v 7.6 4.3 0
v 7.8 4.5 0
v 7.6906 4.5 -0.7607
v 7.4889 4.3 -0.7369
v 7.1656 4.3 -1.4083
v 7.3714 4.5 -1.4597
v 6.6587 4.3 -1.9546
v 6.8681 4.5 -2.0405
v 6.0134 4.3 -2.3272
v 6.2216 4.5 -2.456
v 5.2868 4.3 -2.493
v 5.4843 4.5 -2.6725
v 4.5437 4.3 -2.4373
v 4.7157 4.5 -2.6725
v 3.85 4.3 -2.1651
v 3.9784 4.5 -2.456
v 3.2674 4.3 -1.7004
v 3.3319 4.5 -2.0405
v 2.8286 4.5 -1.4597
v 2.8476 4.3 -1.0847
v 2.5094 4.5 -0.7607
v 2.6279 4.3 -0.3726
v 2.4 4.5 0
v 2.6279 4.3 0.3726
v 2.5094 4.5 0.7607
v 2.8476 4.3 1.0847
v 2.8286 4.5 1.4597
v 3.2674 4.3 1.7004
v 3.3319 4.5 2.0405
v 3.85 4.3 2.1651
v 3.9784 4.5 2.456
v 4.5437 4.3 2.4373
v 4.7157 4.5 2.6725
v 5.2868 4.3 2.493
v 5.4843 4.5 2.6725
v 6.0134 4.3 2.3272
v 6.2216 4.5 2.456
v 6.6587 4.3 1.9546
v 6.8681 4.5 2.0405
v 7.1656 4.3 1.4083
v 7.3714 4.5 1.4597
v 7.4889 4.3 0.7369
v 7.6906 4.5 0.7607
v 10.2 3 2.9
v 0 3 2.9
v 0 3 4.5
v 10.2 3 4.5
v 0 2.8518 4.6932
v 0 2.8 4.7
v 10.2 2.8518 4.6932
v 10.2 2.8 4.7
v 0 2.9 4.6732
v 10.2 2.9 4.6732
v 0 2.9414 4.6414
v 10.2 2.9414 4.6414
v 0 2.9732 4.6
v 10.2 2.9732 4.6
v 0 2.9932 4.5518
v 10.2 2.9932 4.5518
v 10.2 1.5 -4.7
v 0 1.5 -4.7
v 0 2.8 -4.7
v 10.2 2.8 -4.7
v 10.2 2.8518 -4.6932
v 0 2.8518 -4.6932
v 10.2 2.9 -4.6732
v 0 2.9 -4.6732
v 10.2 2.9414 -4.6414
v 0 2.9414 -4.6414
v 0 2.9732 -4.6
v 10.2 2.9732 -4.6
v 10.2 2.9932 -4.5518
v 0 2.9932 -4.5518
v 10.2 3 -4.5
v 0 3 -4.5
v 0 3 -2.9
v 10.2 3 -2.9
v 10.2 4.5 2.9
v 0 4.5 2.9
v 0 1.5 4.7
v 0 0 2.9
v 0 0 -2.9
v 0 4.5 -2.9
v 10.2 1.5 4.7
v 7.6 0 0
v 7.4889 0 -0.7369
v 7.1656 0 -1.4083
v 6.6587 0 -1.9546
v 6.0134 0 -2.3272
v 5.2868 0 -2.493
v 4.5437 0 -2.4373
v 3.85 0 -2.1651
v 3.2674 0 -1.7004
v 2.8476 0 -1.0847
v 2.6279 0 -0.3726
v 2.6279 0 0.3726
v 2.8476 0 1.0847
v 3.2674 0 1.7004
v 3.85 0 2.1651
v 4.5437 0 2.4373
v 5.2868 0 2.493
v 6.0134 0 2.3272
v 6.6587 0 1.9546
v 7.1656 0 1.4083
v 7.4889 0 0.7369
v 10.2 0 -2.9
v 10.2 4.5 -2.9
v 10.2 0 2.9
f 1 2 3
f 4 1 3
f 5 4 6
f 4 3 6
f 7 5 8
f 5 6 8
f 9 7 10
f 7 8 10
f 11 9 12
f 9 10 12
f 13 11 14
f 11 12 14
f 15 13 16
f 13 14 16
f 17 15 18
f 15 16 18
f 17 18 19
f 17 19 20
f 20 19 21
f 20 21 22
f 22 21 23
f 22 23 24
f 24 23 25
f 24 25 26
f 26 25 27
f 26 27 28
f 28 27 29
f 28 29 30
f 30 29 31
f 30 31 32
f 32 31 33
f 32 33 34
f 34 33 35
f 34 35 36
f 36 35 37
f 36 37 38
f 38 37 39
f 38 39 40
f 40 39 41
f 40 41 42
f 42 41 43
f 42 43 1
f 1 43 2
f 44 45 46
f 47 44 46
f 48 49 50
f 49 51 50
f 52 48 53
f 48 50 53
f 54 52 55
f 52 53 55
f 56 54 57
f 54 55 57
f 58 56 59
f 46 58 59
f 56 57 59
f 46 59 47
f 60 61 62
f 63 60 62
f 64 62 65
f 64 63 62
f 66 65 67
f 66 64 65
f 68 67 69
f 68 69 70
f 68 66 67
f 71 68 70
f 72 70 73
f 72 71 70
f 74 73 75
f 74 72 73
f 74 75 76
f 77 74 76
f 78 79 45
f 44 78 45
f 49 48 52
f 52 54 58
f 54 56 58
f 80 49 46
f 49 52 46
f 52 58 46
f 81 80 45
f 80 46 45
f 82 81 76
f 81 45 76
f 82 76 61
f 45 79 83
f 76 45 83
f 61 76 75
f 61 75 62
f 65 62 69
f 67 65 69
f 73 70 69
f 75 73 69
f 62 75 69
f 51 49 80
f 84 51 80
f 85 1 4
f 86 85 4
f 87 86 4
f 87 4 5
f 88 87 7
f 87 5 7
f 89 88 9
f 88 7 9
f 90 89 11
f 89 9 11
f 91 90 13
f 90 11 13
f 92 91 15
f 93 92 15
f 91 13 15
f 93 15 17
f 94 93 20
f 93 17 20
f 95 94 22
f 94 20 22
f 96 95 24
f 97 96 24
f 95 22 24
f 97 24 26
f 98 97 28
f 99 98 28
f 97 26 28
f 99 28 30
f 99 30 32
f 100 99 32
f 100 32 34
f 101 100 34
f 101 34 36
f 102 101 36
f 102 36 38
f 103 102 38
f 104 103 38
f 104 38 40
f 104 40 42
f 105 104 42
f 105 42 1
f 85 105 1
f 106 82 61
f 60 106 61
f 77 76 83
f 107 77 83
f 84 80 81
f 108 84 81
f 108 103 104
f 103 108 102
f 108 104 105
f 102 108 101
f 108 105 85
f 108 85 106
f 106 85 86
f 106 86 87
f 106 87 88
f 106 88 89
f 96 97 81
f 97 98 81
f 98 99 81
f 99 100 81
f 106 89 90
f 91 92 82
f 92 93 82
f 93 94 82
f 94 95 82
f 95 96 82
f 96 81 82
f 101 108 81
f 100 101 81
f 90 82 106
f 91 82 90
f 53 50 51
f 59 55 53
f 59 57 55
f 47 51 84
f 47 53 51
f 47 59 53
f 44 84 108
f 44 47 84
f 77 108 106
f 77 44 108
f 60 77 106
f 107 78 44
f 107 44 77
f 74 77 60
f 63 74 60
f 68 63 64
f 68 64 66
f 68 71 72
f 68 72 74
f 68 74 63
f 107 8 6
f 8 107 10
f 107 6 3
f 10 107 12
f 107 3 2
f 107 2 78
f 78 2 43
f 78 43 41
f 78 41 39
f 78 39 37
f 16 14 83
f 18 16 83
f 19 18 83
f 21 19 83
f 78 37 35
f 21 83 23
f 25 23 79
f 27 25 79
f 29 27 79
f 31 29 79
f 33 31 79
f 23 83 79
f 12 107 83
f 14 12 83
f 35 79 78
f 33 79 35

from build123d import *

# Parameters (mm, degrees)
BODY_DEPTH      = 10.2
SKETCH_2_R      = 2.5
SCREWHOLE_DEPTH = 10.2
CHAMFER_2_SIZE  = 0.2
FILLET_2_R      = 0.2


with BuildPart() as part:
    # Эскиз1 → Body (new body)
    with BuildSketch(Plane(origin=(0, 0, 0), x_dir=(0, 0, -1), z_dir=(1, 0, 0))):
        Polygon((-2.9, 0), (2.9, 0), (4.7, 1.5), (4.7, 3), (2.9, 3), (2.9, 4.5), (-2.9, 4.5), (-2.9, 3), (-4.7, 3), (-4.7, 1.5), align=None)
    extrude(amount=BODY_DEPTH)

    # Эскиз2 → screwHole (cut)
    with BuildSketch(Plane(origin=(0, 4.5, 0), x_dir=(1, 0, 0), z_dir=(0, 1, 0))):
        with Locations((5.1, 0)):
            Circle(SKETCH_2_R)
    extrude(amount=-SCREWHOLE_DEPTH, mode=Mode.SUBTRACT)

    # Chamfer 2
    chamfer_2_edges = [part.edges().sort_by_distance(p)[0] for p in [
        (2.6, 4.5, 0),
    ]]
    chamfer(chamfer_2_edges, length=CHAMFER_2_SIZE)

    # Fillet 2
    fillet_2_edges = [part.edges().sort_by_distance(p)[0] for p in [
        (5.1, 3, 4.7),
        (5.1, 3, -4.7),
    ]]
    fillet(fillet_2_edges, radius=FILLET_2_R)


solid = part.part
